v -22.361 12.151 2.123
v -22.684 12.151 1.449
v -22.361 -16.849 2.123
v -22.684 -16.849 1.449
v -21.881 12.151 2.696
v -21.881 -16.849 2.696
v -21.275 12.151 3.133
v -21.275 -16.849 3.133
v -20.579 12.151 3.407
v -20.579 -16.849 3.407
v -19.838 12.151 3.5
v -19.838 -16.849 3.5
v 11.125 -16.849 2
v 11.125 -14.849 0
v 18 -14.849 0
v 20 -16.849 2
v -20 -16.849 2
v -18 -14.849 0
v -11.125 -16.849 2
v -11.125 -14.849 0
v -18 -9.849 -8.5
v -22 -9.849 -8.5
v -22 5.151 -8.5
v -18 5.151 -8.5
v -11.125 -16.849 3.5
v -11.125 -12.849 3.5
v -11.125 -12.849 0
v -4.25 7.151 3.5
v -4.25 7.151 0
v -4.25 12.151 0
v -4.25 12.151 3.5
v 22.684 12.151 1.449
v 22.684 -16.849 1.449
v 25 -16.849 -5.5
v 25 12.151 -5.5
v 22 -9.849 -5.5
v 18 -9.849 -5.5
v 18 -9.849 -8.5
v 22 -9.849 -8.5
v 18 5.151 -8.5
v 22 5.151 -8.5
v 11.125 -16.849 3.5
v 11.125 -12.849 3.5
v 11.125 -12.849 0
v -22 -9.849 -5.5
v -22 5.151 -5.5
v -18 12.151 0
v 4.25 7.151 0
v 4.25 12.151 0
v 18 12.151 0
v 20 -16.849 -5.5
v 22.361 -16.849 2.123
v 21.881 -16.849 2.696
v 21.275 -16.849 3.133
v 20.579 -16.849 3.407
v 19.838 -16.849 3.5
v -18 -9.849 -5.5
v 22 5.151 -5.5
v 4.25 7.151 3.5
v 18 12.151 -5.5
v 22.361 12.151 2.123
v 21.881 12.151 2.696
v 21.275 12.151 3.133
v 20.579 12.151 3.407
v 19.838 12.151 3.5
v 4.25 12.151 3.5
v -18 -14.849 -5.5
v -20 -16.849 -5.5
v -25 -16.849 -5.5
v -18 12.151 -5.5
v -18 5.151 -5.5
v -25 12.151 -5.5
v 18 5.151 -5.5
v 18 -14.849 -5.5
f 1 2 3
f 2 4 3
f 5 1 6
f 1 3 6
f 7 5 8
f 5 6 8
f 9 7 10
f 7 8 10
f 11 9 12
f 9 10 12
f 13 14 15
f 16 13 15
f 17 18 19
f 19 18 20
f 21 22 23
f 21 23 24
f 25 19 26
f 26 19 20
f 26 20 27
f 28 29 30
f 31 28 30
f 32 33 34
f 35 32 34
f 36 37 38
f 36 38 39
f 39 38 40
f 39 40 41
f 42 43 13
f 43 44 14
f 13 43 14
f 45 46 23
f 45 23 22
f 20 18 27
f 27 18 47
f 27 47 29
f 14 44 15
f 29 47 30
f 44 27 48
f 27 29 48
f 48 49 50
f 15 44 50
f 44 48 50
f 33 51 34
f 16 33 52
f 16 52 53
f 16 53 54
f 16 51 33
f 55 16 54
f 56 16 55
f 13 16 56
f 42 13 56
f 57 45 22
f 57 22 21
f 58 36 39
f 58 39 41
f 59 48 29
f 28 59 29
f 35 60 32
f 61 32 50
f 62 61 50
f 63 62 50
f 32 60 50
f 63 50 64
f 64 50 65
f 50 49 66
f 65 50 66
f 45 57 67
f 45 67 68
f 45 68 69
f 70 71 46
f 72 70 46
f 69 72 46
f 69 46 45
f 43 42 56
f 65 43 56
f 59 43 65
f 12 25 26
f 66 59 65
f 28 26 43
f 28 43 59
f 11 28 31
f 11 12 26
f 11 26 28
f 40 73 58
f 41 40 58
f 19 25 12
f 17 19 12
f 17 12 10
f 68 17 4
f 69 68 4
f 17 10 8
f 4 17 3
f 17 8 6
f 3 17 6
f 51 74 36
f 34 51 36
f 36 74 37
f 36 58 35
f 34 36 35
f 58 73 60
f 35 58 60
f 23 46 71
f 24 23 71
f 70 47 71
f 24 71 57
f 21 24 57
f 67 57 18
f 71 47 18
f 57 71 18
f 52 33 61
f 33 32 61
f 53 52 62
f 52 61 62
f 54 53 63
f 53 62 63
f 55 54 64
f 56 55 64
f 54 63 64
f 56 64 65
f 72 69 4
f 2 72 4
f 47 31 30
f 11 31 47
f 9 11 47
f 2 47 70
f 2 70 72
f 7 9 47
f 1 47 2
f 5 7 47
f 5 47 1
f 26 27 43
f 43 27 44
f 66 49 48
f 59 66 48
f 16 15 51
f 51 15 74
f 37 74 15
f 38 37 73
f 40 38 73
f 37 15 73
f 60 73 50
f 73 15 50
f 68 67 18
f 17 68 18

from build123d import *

# Parameters (mm, degrees)
F1_DEPTH  = 3.5
F2_W      = 29
F2_H      = 9
F3_DEPTH  = 4
F4_W      = 29
F4_H      = 9
F5_DEPTH  = 4
F6_SIZE   = 2
F7_W      = 4
F7_H      = 15
F8_DEPTH  = 3
F9_SIZE   = 2
F11_DEPTH = 29
F12_R     = 3


with BuildPart() as f1:
    # F0 (on Top) → F1 (new body)
    with BuildSketch(Plane.XY):
        Polygon((-4.25, 12.1511180716), (-18, 12.1511180716), (-18, -16.8488819284), (-11.125, -16.8488819284), (-11.125, -12.8488819284), (11.125, -12.8488819284), (11.125, -16.8488819284), (18, -16.8488819284), (18, 12.1511180716), (4.25, 12.1511180716), (4.25, 7.1511180716), (-4.25, 7.1511180716), align=None)
    extrude(amount=F1_DEPTH)

    # F2 (on face) → F3 (join)
    with BuildSketch(Plane(origin=(-18, 0, 0), x_dir=(0, -1, 0), z_dir=(-1, 0, 0))):
        with Locations((2.3488819284, -1)):
            Rectangle(F2_W, F2_H)
    extrude(amount=F3_DEPTH)

    # F4 (on face) → F5 (join)
    with BuildSketch(Plane.YZ.offset(18)):
        with Locations((-2.3488819284, -1)):
            Rectangle(F4_W, F4_H)
    extrude(amount=F5_DEPTH)

    # F6
    f6_edges = [f1.edges().sort_by_distance(p)[0] for p in [
        (-14.5625, -16.848882, 0),
        (14.5625, -16.848882, 0),
    ]]
    chamfer(f6_edges, length=F6_SIZE)

    # F7 (on face) → F8 (join)
    with BuildSketch(Plane(origin=(0, 0, -5.5), x_dir=(1, 0, 0), z_dir=(0, 0, -1))):
        with Locations((20, 2.3488819284)):
            Rectangle(F7_W, F7_H)
        with Locations((-20, 2.3488819284)):
            Rectangle(F7_W, F7_H)
    extrude(amount=F8_DEPTH)

    # F9
    f9_edges = [f1.edges().sort_by_distance(p)[0] for p in [
        (18, -16.848882, -1.75),
        (-18, -16.848882, -1.75),
    ]]
    chamfer(f9_edges, length=F9_SIZE)

    # F10 (on face) → F11 (join, through all)
    with BuildSketch(Plane(origin=(0, 12.1511180716, 0), x_dir=(-1, 0, 0), z_dir=(0, 1, 0))):
        Polygon((25, -5.5), (22, 3.5), (22, -5.5), align=None)
        Polygon((-22, -5.5), (-22, 3.5), (-25, -5.5), align=None)
    extrude(amount=-F11_DEPTH)

    # F12
    f12_edges = [f1.edges().sort_by_distance(p)[0] for p in [
        (-22, -2.348882, 3.5),
        (22, -2.348882, 3.5),
    ]]
    fillet(f12_edges, radius=F12_R)


solid = f1.part
